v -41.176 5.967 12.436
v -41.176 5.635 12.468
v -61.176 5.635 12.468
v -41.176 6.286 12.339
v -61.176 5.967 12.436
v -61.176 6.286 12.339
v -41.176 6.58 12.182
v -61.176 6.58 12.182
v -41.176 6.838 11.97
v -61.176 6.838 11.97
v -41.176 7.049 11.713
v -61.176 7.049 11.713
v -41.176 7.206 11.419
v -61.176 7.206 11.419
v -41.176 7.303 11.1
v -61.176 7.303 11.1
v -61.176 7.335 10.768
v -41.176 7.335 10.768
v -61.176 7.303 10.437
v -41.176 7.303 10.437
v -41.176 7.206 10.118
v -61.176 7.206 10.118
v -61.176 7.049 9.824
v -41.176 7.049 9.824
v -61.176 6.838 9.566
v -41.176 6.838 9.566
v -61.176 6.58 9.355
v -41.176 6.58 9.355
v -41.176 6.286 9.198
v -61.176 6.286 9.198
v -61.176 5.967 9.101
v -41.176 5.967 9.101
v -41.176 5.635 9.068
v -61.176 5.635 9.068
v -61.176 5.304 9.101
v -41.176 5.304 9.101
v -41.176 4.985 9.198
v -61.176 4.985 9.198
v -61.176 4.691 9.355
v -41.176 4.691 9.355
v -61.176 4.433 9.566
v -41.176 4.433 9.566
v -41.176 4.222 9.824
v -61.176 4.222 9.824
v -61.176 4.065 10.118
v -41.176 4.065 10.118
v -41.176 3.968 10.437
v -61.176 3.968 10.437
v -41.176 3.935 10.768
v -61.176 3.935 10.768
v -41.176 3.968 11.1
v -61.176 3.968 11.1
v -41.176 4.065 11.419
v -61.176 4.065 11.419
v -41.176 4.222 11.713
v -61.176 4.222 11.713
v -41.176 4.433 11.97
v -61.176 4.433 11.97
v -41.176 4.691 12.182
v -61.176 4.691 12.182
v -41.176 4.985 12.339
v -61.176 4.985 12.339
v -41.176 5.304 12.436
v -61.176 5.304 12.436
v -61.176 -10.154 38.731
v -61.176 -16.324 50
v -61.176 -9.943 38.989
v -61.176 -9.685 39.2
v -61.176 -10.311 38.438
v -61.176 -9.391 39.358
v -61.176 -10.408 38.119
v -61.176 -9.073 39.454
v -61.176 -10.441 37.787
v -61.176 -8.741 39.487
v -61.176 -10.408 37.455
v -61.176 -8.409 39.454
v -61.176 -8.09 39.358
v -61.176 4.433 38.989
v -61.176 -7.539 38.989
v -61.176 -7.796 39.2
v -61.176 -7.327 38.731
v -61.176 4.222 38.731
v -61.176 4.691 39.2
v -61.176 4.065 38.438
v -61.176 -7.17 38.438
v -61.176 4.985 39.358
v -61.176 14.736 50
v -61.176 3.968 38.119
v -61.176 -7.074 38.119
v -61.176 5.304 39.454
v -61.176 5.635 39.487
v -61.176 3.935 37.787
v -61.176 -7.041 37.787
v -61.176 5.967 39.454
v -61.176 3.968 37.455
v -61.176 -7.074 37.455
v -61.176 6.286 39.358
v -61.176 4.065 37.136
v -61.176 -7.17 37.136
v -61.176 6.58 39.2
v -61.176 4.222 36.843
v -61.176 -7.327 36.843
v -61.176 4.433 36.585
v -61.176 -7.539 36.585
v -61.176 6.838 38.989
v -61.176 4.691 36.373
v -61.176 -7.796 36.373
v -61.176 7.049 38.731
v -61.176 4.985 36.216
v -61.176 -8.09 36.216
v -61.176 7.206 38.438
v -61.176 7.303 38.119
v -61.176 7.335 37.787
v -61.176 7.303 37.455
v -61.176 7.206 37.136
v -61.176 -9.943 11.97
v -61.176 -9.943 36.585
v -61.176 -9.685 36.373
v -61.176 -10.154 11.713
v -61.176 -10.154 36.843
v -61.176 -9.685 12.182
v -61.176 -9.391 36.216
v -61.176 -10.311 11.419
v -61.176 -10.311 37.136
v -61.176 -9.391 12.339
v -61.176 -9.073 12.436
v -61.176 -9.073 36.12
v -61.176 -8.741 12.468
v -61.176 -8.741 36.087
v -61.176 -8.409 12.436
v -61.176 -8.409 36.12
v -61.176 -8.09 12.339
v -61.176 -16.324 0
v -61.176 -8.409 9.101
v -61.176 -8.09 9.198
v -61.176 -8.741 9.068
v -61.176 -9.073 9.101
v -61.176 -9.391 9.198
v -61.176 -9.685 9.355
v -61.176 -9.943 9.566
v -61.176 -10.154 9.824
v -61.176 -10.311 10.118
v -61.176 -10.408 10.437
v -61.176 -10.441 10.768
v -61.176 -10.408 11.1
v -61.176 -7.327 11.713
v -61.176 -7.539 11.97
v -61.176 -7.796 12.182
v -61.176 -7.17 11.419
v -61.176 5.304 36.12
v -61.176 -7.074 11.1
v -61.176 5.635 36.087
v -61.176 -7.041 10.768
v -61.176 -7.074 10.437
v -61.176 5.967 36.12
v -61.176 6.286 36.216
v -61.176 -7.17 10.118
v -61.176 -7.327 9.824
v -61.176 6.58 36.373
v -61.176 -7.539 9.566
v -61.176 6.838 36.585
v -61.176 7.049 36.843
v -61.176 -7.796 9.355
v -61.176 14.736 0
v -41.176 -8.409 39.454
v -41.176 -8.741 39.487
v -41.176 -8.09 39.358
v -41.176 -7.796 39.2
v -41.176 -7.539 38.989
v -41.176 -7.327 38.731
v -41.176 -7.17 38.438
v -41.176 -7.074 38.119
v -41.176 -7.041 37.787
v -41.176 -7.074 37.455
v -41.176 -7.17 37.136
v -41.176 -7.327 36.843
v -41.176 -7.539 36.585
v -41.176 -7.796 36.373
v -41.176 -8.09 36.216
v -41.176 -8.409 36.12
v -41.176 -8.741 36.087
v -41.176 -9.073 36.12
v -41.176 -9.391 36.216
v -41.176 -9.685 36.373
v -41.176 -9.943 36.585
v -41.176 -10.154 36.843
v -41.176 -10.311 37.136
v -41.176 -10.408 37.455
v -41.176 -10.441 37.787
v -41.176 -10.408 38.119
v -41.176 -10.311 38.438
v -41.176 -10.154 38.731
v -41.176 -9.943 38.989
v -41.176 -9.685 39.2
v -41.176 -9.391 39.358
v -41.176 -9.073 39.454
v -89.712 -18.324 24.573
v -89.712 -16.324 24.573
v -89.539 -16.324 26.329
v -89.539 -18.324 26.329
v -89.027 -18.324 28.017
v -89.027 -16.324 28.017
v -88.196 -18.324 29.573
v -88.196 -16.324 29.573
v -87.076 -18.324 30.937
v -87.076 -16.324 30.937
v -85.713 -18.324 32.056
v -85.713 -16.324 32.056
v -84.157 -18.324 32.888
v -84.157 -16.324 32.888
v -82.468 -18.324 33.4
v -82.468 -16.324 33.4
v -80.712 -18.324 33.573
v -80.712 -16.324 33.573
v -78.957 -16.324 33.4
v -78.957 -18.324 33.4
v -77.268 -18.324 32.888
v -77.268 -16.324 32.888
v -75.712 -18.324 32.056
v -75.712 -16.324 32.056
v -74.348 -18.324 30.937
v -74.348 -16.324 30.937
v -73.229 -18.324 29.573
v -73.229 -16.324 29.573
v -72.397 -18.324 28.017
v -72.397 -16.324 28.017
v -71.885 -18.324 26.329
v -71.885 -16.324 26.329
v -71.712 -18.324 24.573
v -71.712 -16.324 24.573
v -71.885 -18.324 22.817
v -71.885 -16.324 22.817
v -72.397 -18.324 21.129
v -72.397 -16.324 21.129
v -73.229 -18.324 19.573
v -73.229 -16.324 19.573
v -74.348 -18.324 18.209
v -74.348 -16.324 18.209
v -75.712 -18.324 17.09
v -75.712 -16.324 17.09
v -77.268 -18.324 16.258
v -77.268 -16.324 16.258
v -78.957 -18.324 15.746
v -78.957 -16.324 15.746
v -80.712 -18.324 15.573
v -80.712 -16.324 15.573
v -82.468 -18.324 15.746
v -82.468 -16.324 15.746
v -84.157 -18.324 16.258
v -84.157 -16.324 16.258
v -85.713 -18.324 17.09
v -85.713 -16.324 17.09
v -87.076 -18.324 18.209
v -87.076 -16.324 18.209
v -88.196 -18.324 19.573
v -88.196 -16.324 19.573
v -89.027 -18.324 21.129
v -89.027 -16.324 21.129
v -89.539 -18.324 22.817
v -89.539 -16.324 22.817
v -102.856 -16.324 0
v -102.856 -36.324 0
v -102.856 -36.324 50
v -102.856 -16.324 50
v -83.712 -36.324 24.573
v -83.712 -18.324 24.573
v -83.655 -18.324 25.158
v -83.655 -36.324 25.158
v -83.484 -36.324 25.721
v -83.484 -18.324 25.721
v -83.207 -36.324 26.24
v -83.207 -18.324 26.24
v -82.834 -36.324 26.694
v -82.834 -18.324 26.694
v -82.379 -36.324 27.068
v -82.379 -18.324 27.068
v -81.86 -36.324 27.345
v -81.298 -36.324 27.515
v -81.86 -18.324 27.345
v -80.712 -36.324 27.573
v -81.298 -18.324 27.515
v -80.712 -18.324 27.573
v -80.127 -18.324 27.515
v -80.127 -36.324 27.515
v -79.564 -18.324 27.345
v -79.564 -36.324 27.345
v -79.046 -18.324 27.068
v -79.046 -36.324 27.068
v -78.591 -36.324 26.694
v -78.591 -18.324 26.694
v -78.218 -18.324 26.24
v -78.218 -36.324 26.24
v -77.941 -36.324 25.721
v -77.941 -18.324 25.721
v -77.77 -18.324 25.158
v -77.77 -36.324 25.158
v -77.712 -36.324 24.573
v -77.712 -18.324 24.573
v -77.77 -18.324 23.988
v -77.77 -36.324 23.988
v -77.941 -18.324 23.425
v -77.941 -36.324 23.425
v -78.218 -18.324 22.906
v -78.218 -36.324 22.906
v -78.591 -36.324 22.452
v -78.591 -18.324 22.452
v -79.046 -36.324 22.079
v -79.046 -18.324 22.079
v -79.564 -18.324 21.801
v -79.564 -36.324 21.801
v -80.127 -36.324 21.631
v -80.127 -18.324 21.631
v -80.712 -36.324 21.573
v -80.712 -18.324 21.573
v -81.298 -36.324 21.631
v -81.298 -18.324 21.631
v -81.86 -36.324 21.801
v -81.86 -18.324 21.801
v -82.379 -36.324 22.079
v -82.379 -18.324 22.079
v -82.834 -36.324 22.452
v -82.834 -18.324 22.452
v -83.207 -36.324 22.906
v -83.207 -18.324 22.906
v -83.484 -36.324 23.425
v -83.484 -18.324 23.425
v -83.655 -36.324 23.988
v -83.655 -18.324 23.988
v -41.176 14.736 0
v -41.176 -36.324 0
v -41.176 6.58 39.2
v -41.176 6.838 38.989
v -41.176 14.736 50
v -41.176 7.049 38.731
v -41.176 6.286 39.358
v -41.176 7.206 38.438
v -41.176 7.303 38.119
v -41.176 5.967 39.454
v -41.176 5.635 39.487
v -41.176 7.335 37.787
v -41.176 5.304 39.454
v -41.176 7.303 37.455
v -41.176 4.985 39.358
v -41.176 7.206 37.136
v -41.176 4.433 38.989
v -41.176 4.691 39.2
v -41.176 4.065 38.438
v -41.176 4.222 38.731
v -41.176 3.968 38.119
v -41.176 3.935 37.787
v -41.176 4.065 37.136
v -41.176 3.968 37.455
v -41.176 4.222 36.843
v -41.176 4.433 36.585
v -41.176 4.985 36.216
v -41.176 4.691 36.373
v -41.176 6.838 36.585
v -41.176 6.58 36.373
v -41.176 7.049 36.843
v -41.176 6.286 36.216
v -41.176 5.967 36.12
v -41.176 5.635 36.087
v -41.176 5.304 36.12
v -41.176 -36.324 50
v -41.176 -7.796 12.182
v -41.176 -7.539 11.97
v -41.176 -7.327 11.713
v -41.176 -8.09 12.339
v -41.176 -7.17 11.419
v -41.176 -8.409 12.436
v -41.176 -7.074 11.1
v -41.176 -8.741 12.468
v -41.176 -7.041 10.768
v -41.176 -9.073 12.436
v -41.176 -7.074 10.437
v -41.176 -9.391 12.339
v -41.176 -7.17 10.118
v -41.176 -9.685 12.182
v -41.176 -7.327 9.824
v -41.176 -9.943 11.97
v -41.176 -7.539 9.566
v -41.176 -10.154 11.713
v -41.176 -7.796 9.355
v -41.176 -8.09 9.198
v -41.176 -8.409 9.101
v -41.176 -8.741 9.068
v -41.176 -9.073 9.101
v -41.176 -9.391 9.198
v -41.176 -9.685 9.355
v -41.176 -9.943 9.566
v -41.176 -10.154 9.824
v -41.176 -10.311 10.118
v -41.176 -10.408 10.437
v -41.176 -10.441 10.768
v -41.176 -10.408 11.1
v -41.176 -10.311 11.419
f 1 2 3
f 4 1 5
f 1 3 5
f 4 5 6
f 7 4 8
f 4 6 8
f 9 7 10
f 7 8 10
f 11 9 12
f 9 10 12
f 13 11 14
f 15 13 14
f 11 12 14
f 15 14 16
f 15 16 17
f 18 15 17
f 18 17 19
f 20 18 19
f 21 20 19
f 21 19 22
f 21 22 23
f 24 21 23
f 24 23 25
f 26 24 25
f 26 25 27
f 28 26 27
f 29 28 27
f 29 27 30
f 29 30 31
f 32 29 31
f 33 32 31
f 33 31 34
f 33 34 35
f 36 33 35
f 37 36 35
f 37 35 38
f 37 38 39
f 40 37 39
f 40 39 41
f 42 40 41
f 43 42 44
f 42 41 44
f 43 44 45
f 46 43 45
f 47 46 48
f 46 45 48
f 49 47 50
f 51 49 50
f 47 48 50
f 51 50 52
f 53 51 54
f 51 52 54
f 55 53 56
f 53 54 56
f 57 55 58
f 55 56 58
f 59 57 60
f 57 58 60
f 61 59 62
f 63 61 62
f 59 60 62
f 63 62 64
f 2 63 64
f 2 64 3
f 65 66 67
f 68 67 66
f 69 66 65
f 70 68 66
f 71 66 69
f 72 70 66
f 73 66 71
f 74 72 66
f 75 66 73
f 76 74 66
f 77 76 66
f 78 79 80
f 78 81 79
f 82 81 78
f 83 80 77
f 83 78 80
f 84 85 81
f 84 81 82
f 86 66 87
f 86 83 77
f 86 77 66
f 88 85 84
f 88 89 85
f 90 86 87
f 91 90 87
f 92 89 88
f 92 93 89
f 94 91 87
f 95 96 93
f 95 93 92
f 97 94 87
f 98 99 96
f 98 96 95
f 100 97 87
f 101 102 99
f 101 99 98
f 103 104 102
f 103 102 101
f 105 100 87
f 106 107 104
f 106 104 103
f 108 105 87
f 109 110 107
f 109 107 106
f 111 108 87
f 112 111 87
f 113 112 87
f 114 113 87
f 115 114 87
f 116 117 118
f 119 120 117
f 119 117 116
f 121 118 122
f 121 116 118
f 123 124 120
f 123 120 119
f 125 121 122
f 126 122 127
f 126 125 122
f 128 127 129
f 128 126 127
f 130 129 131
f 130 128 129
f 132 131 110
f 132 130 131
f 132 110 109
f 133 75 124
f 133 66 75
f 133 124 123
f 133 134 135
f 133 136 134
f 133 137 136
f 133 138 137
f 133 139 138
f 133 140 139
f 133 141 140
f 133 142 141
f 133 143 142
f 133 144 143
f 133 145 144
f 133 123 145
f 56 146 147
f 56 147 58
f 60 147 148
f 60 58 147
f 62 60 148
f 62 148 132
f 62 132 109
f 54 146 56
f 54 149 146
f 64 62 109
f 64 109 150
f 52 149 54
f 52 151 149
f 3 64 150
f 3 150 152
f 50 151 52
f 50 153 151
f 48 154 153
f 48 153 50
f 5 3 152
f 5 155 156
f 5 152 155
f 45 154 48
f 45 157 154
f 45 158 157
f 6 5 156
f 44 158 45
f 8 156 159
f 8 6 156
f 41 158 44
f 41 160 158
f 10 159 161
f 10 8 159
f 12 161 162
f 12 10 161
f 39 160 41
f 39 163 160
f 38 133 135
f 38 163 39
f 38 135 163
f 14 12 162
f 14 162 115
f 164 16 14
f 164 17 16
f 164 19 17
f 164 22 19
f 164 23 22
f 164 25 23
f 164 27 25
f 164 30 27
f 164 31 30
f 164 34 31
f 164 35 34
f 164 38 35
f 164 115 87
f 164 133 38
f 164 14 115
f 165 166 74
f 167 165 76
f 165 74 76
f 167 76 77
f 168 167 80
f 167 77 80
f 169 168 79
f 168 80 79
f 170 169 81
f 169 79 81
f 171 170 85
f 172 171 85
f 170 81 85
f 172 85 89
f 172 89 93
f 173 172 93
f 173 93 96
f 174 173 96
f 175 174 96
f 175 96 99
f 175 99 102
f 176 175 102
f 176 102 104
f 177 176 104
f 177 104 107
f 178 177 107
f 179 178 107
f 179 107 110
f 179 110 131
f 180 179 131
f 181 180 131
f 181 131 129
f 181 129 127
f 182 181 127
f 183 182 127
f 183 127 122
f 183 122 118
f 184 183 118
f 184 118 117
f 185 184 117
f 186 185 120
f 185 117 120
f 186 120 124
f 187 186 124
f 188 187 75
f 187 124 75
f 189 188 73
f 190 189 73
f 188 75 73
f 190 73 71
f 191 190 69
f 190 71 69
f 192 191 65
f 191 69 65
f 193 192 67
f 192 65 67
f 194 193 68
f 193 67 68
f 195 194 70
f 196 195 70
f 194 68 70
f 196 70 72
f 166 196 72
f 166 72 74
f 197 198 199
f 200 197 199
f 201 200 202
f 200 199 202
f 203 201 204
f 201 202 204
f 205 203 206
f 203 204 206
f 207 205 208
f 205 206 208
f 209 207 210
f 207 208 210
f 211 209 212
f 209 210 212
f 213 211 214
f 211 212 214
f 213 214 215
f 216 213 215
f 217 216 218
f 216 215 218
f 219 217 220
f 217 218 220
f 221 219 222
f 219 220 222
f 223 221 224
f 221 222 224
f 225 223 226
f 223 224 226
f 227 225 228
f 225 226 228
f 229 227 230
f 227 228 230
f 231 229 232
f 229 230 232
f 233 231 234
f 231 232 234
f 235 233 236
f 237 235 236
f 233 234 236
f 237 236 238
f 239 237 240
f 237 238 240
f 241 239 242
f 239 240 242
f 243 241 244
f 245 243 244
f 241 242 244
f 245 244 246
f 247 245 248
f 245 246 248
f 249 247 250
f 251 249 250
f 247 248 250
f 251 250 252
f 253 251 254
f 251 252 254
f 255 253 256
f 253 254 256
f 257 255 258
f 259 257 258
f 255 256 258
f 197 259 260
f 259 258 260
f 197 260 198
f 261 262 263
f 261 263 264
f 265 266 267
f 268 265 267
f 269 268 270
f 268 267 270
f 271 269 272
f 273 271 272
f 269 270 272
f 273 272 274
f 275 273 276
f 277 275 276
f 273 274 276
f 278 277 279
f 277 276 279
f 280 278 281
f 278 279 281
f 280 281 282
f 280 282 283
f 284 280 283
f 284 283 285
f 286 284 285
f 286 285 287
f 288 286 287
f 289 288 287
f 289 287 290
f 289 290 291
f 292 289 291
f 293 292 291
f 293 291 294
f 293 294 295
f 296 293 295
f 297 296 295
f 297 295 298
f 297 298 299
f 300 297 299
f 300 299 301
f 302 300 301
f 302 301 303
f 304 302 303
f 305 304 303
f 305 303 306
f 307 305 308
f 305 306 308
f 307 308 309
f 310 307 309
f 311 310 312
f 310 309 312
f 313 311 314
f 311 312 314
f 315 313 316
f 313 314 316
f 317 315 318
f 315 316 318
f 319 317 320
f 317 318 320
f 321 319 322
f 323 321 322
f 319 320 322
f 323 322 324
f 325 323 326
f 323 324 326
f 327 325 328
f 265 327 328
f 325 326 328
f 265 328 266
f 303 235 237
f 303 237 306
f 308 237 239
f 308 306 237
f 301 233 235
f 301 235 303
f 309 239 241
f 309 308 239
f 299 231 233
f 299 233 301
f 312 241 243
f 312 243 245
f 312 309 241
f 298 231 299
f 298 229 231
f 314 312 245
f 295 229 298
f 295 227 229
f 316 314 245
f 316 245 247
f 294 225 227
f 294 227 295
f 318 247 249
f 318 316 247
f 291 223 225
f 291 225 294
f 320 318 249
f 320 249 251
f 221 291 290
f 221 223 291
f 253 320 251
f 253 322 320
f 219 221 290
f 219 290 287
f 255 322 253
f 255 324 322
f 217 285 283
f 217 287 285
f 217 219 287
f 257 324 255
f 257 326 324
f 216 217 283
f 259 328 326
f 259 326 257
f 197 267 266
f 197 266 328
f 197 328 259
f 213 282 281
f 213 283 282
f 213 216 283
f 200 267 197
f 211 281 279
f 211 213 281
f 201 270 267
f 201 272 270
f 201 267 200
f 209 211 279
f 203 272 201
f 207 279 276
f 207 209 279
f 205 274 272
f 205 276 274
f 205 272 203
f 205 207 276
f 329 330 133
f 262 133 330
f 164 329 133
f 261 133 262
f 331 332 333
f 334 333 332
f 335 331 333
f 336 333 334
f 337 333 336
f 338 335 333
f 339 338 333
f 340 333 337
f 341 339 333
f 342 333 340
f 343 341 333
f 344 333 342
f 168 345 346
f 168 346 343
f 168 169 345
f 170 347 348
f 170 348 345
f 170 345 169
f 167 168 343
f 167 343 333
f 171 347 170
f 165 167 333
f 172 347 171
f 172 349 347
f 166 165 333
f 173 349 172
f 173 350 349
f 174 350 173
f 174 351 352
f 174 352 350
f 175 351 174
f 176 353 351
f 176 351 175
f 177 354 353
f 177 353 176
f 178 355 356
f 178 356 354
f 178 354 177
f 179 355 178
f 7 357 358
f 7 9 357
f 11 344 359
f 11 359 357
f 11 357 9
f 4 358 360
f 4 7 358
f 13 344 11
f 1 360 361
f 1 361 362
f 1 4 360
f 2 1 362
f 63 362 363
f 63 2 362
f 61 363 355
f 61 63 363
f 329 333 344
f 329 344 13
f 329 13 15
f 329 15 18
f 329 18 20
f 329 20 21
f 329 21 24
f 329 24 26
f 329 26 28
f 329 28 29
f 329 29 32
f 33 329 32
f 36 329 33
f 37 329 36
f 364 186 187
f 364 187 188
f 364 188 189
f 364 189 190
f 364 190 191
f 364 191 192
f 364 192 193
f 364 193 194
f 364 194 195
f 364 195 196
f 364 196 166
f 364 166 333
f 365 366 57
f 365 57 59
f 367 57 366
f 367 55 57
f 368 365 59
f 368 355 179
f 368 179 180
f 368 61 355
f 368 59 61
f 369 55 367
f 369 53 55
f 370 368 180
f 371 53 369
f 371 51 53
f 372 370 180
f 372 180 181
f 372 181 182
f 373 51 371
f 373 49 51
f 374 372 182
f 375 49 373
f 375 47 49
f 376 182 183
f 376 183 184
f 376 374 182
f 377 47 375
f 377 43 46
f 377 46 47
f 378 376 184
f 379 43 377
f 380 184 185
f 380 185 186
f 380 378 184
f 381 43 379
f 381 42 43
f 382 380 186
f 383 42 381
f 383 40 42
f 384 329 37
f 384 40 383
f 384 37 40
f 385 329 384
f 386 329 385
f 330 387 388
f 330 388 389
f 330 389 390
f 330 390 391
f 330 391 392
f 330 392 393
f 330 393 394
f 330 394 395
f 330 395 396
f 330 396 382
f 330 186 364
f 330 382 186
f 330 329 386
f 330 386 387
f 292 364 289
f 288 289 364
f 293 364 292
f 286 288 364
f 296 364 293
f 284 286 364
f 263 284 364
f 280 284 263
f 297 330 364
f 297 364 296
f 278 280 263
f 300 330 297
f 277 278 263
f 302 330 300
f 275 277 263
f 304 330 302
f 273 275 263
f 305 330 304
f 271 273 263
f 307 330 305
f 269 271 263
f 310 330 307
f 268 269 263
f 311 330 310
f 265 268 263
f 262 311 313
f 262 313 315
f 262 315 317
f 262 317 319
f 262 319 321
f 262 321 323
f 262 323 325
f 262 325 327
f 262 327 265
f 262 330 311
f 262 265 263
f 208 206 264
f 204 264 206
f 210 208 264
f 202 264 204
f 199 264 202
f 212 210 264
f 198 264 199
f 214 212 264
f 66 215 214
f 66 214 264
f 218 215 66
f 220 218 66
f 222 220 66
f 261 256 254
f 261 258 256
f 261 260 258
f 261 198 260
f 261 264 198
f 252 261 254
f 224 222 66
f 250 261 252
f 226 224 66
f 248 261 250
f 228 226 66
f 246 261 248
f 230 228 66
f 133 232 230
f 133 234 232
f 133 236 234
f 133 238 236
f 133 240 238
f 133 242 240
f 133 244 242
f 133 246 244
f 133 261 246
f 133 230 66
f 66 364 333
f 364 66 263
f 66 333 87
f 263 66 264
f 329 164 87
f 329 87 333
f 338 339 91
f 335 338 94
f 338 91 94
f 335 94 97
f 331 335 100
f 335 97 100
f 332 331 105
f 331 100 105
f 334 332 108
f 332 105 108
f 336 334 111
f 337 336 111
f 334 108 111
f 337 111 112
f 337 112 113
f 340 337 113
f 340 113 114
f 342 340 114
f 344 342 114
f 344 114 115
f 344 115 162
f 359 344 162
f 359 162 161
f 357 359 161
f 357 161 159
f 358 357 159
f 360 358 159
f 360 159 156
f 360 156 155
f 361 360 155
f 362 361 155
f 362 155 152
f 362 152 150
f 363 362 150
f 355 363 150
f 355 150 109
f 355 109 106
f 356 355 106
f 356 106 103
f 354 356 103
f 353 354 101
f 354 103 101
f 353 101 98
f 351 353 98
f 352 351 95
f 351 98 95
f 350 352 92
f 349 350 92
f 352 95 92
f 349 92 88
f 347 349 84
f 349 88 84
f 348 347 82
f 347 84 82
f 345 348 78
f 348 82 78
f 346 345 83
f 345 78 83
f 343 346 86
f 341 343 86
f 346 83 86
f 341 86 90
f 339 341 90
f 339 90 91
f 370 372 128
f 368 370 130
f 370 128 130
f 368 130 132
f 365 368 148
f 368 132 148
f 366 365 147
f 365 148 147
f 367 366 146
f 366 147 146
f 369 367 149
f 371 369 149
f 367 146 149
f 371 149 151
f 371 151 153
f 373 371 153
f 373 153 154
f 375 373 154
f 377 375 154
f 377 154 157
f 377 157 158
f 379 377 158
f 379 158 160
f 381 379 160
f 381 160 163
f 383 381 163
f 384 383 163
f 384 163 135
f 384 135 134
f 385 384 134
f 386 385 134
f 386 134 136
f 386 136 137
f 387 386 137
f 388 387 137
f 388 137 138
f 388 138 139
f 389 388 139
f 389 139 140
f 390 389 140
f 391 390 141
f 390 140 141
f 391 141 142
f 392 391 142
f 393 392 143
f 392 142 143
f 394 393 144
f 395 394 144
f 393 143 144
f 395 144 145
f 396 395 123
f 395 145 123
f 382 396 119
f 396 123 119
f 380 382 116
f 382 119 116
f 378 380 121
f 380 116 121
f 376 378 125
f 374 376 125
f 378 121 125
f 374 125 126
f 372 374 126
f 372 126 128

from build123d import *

# Parameters (mm, degrees)
BOSS_EXTRUDE1_DEPTH = 50
SKETCH2_R           = 1.7
CUT_EXTRUDE2_DEPTH  = 75.542415548
SKETCH3_R           = 3
CUT_EXTRUDE3_DEPTH  = 119.507616013
SKETCH4_R           = 9
CUT_EXTRUDE4_DEPTH  = 2


with BuildPart() as part:
    # Sketch1 → Boss-Extrude1 (new body)
    with BuildSketch(Plane.XY):
        Polygon((-41.176470588, 14.736470588), (-41.176470588, -36.323529412), (-102.855877095, -36.323529412), (-102.855877095, -16.323529412), (-61.176470588, -16.323529412), (-61.176470588, 14.736470588), align=None)
    extrude(amount=BOSS_EXTRUDE1_DEPTH)

    # Sketch2 → Cut-Extrude2 (cut, through all)
    with BuildSketch(Plane.ZY.offset(61.176470588)):
        with Locations((10.768169464, 5.635466658)):
            Circle(SKETCH2_R)
        with Locations((37.786974644, 5.635466658)):
            Circle(SKETCH2_R)
        with Locations((10.768169464, -8.740849467)):
            Circle(SKETCH2_R)
        with Locations((37.786974644, -8.740849467)):
            Circle(SKETCH2_R)
    extrude(amount=-CUT_EXTRUDE2_DEPTH, mode=Mode.SUBTRACT)

    # Sketch3 → Cut-Extrude3 (cut, through all)
    with BuildSketch(Plane(origin=(0, -16.323529412, 0), x_dir=(1, 0, 0), z_dir=(0, 1, 0))):
        with Locations(Location((-80.712404336, -24.573120592, 0), (0, 0, 180))):
            Circle(SKETCH3_R)
    extrude(amount=-CUT_EXTRUDE3_DEPTH, mode=Mode.SUBTRACT)

    # Sketch4 → Cut-Extrude4 (cut)
    with BuildSketch(Plane(origin=(0, -16.323529412, 0), x_dir=(1, 0, 0), z_dir=(0, 1, 0))):
        with Locations(Location((-80.712404336, -24.573120592, 0), (0, 0, 180))):
            Circle(SKETCH4_R)
    extrude(amount=-CUT_EXTRUDE4_DEPTH, mode=Mode.SUBTRACT)


solid = part.part
